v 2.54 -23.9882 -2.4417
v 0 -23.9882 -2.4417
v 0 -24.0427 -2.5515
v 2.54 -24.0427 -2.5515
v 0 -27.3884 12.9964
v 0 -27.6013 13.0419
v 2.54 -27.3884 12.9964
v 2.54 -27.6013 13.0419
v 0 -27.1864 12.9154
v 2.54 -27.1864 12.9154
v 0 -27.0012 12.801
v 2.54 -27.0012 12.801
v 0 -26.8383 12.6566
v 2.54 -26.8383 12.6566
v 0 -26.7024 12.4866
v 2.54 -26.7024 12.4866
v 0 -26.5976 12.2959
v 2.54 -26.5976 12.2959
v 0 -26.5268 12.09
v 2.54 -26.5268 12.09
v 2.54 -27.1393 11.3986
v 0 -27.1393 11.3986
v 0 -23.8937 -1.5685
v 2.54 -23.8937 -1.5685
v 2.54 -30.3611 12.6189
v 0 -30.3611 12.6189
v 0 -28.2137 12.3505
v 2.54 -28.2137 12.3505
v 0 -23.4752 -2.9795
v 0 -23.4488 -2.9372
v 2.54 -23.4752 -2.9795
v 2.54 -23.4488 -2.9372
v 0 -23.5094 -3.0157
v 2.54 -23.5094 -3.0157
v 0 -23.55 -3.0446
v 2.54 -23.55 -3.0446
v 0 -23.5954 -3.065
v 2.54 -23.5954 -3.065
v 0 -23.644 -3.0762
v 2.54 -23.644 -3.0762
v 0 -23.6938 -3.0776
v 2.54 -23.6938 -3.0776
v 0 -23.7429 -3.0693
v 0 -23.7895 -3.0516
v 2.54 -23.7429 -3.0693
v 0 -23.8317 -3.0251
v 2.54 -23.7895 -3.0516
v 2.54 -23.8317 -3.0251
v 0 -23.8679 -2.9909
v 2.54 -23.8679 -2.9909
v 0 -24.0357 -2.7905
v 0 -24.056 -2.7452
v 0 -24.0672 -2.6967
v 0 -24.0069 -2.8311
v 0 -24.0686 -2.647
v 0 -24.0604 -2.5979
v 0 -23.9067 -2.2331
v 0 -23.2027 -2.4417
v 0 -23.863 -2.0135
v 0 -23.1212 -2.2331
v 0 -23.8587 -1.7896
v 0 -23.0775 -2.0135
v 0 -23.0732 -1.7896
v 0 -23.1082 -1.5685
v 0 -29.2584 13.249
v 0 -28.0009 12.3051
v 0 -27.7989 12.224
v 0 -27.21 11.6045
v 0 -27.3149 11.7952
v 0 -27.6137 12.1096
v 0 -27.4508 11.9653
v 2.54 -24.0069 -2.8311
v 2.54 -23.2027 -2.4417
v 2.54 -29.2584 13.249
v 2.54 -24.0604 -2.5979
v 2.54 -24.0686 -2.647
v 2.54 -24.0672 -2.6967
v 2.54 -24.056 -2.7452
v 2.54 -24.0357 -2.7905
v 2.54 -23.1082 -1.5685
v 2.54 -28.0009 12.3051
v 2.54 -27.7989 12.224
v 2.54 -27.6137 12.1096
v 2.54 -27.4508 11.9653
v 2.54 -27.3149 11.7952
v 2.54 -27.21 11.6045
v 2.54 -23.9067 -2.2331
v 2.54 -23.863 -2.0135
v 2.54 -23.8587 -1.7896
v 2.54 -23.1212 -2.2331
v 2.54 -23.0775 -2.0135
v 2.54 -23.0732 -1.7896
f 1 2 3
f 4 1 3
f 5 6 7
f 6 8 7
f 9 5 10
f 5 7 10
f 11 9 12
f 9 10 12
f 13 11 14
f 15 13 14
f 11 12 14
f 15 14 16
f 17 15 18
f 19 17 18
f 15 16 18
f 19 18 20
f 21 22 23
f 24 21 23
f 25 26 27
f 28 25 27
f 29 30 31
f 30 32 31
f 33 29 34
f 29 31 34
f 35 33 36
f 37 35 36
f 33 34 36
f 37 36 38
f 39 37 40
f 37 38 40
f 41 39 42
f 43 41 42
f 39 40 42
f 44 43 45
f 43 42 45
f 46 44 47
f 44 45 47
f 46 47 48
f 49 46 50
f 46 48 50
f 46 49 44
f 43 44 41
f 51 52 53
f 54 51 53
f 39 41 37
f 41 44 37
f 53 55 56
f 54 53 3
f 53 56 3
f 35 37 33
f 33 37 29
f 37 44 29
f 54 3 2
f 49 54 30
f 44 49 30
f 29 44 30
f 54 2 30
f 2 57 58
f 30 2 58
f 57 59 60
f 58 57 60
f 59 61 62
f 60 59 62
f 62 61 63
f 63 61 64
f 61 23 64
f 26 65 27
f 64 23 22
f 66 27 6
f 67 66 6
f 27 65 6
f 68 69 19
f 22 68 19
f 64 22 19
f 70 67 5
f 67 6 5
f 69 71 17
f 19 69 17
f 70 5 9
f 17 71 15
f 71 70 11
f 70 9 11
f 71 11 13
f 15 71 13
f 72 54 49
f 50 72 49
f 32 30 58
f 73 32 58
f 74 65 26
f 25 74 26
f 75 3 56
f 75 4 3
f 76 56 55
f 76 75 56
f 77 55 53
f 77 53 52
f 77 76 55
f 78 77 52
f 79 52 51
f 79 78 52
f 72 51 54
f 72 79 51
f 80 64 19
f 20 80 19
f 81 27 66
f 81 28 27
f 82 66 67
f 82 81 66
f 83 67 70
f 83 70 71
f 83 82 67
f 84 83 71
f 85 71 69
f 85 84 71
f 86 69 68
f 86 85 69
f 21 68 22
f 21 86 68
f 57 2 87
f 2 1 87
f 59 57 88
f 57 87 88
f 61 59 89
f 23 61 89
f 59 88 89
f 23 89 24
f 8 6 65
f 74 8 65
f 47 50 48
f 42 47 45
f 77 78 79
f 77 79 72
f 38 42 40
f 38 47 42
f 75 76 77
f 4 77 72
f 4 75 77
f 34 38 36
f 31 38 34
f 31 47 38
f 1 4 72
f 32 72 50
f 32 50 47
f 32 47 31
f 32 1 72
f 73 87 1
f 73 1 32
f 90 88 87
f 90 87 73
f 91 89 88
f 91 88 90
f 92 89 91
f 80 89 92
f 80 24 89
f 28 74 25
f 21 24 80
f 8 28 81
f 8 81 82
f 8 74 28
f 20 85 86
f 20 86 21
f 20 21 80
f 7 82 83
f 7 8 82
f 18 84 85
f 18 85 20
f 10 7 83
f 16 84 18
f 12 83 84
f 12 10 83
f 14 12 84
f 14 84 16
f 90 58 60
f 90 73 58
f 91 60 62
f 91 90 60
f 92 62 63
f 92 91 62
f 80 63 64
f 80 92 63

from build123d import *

# Parameters (mm, degrees)
F1_DEPTH = 2.54
F2_R     = 1.27
F3_R     = 0.254
F4_R     = 1.27
F5_R     = 0.254
F6_R     = 1.27
F7_R     = 1.27


with BuildPart() as f1:
    # F0 (on Right) → F1 (new body)
    with BuildSketch(Plane.YZ):
        Polygon((-29.258431, 13.248995), (-30.3611, 12.618899), (-27.350505, 12.242574), (-23.780038, -2.022478), (-24.11806, -2.703207), (-23.618102, -3.27826), (-22.994532, -2.022478), (-26.738045, 12.933947), align=None)
    extrude(amount=F1_DEPTH)

    # F2
    f2_edges = [f1.edges().sort_by_distance(p)[0] for p in [
        (1.27, -22.994532, -2.022478),
    ]]
    fillet(f2_edges, radius=F2_R)

    # F3
    f3_edges = [f1.edges().sort_by_distance(p)[0] for p in [
        (1.27, -23.618102, -3.27826),
    ]]
    fillet(f3_edges, radius=F3_R)

    # F4
    f4_edges = [f1.edges().sort_by_distance(p)[0] for p in [
        (1.27, -23.780038, -2.022478),
    ]]
    fillet(f4_edges, radius=F4_R)

    # F5
    f5_edges = [f1.edges().sort_by_distance(p)[0] for p in [
        (1.27, -24.11806, -2.703207),
    ]]
    fillet(f5_edges, radius=F5_R)

    # F6
    f6_edges = [f1.edges().sort_by_distance(p)[0] for p in [
        (1.27, -26.738045, 12.933947),
    ]]
    fillet(f6_edges, radius=F6_R)

    # F7
    f7_edges = [f1.edges().sort_by_distance(p)[0] for p in [
        (1.27, -27.350505, 12.242574),
    ]]
    fillet(f7_edges, radius=F7_R)


solid = f1.part
